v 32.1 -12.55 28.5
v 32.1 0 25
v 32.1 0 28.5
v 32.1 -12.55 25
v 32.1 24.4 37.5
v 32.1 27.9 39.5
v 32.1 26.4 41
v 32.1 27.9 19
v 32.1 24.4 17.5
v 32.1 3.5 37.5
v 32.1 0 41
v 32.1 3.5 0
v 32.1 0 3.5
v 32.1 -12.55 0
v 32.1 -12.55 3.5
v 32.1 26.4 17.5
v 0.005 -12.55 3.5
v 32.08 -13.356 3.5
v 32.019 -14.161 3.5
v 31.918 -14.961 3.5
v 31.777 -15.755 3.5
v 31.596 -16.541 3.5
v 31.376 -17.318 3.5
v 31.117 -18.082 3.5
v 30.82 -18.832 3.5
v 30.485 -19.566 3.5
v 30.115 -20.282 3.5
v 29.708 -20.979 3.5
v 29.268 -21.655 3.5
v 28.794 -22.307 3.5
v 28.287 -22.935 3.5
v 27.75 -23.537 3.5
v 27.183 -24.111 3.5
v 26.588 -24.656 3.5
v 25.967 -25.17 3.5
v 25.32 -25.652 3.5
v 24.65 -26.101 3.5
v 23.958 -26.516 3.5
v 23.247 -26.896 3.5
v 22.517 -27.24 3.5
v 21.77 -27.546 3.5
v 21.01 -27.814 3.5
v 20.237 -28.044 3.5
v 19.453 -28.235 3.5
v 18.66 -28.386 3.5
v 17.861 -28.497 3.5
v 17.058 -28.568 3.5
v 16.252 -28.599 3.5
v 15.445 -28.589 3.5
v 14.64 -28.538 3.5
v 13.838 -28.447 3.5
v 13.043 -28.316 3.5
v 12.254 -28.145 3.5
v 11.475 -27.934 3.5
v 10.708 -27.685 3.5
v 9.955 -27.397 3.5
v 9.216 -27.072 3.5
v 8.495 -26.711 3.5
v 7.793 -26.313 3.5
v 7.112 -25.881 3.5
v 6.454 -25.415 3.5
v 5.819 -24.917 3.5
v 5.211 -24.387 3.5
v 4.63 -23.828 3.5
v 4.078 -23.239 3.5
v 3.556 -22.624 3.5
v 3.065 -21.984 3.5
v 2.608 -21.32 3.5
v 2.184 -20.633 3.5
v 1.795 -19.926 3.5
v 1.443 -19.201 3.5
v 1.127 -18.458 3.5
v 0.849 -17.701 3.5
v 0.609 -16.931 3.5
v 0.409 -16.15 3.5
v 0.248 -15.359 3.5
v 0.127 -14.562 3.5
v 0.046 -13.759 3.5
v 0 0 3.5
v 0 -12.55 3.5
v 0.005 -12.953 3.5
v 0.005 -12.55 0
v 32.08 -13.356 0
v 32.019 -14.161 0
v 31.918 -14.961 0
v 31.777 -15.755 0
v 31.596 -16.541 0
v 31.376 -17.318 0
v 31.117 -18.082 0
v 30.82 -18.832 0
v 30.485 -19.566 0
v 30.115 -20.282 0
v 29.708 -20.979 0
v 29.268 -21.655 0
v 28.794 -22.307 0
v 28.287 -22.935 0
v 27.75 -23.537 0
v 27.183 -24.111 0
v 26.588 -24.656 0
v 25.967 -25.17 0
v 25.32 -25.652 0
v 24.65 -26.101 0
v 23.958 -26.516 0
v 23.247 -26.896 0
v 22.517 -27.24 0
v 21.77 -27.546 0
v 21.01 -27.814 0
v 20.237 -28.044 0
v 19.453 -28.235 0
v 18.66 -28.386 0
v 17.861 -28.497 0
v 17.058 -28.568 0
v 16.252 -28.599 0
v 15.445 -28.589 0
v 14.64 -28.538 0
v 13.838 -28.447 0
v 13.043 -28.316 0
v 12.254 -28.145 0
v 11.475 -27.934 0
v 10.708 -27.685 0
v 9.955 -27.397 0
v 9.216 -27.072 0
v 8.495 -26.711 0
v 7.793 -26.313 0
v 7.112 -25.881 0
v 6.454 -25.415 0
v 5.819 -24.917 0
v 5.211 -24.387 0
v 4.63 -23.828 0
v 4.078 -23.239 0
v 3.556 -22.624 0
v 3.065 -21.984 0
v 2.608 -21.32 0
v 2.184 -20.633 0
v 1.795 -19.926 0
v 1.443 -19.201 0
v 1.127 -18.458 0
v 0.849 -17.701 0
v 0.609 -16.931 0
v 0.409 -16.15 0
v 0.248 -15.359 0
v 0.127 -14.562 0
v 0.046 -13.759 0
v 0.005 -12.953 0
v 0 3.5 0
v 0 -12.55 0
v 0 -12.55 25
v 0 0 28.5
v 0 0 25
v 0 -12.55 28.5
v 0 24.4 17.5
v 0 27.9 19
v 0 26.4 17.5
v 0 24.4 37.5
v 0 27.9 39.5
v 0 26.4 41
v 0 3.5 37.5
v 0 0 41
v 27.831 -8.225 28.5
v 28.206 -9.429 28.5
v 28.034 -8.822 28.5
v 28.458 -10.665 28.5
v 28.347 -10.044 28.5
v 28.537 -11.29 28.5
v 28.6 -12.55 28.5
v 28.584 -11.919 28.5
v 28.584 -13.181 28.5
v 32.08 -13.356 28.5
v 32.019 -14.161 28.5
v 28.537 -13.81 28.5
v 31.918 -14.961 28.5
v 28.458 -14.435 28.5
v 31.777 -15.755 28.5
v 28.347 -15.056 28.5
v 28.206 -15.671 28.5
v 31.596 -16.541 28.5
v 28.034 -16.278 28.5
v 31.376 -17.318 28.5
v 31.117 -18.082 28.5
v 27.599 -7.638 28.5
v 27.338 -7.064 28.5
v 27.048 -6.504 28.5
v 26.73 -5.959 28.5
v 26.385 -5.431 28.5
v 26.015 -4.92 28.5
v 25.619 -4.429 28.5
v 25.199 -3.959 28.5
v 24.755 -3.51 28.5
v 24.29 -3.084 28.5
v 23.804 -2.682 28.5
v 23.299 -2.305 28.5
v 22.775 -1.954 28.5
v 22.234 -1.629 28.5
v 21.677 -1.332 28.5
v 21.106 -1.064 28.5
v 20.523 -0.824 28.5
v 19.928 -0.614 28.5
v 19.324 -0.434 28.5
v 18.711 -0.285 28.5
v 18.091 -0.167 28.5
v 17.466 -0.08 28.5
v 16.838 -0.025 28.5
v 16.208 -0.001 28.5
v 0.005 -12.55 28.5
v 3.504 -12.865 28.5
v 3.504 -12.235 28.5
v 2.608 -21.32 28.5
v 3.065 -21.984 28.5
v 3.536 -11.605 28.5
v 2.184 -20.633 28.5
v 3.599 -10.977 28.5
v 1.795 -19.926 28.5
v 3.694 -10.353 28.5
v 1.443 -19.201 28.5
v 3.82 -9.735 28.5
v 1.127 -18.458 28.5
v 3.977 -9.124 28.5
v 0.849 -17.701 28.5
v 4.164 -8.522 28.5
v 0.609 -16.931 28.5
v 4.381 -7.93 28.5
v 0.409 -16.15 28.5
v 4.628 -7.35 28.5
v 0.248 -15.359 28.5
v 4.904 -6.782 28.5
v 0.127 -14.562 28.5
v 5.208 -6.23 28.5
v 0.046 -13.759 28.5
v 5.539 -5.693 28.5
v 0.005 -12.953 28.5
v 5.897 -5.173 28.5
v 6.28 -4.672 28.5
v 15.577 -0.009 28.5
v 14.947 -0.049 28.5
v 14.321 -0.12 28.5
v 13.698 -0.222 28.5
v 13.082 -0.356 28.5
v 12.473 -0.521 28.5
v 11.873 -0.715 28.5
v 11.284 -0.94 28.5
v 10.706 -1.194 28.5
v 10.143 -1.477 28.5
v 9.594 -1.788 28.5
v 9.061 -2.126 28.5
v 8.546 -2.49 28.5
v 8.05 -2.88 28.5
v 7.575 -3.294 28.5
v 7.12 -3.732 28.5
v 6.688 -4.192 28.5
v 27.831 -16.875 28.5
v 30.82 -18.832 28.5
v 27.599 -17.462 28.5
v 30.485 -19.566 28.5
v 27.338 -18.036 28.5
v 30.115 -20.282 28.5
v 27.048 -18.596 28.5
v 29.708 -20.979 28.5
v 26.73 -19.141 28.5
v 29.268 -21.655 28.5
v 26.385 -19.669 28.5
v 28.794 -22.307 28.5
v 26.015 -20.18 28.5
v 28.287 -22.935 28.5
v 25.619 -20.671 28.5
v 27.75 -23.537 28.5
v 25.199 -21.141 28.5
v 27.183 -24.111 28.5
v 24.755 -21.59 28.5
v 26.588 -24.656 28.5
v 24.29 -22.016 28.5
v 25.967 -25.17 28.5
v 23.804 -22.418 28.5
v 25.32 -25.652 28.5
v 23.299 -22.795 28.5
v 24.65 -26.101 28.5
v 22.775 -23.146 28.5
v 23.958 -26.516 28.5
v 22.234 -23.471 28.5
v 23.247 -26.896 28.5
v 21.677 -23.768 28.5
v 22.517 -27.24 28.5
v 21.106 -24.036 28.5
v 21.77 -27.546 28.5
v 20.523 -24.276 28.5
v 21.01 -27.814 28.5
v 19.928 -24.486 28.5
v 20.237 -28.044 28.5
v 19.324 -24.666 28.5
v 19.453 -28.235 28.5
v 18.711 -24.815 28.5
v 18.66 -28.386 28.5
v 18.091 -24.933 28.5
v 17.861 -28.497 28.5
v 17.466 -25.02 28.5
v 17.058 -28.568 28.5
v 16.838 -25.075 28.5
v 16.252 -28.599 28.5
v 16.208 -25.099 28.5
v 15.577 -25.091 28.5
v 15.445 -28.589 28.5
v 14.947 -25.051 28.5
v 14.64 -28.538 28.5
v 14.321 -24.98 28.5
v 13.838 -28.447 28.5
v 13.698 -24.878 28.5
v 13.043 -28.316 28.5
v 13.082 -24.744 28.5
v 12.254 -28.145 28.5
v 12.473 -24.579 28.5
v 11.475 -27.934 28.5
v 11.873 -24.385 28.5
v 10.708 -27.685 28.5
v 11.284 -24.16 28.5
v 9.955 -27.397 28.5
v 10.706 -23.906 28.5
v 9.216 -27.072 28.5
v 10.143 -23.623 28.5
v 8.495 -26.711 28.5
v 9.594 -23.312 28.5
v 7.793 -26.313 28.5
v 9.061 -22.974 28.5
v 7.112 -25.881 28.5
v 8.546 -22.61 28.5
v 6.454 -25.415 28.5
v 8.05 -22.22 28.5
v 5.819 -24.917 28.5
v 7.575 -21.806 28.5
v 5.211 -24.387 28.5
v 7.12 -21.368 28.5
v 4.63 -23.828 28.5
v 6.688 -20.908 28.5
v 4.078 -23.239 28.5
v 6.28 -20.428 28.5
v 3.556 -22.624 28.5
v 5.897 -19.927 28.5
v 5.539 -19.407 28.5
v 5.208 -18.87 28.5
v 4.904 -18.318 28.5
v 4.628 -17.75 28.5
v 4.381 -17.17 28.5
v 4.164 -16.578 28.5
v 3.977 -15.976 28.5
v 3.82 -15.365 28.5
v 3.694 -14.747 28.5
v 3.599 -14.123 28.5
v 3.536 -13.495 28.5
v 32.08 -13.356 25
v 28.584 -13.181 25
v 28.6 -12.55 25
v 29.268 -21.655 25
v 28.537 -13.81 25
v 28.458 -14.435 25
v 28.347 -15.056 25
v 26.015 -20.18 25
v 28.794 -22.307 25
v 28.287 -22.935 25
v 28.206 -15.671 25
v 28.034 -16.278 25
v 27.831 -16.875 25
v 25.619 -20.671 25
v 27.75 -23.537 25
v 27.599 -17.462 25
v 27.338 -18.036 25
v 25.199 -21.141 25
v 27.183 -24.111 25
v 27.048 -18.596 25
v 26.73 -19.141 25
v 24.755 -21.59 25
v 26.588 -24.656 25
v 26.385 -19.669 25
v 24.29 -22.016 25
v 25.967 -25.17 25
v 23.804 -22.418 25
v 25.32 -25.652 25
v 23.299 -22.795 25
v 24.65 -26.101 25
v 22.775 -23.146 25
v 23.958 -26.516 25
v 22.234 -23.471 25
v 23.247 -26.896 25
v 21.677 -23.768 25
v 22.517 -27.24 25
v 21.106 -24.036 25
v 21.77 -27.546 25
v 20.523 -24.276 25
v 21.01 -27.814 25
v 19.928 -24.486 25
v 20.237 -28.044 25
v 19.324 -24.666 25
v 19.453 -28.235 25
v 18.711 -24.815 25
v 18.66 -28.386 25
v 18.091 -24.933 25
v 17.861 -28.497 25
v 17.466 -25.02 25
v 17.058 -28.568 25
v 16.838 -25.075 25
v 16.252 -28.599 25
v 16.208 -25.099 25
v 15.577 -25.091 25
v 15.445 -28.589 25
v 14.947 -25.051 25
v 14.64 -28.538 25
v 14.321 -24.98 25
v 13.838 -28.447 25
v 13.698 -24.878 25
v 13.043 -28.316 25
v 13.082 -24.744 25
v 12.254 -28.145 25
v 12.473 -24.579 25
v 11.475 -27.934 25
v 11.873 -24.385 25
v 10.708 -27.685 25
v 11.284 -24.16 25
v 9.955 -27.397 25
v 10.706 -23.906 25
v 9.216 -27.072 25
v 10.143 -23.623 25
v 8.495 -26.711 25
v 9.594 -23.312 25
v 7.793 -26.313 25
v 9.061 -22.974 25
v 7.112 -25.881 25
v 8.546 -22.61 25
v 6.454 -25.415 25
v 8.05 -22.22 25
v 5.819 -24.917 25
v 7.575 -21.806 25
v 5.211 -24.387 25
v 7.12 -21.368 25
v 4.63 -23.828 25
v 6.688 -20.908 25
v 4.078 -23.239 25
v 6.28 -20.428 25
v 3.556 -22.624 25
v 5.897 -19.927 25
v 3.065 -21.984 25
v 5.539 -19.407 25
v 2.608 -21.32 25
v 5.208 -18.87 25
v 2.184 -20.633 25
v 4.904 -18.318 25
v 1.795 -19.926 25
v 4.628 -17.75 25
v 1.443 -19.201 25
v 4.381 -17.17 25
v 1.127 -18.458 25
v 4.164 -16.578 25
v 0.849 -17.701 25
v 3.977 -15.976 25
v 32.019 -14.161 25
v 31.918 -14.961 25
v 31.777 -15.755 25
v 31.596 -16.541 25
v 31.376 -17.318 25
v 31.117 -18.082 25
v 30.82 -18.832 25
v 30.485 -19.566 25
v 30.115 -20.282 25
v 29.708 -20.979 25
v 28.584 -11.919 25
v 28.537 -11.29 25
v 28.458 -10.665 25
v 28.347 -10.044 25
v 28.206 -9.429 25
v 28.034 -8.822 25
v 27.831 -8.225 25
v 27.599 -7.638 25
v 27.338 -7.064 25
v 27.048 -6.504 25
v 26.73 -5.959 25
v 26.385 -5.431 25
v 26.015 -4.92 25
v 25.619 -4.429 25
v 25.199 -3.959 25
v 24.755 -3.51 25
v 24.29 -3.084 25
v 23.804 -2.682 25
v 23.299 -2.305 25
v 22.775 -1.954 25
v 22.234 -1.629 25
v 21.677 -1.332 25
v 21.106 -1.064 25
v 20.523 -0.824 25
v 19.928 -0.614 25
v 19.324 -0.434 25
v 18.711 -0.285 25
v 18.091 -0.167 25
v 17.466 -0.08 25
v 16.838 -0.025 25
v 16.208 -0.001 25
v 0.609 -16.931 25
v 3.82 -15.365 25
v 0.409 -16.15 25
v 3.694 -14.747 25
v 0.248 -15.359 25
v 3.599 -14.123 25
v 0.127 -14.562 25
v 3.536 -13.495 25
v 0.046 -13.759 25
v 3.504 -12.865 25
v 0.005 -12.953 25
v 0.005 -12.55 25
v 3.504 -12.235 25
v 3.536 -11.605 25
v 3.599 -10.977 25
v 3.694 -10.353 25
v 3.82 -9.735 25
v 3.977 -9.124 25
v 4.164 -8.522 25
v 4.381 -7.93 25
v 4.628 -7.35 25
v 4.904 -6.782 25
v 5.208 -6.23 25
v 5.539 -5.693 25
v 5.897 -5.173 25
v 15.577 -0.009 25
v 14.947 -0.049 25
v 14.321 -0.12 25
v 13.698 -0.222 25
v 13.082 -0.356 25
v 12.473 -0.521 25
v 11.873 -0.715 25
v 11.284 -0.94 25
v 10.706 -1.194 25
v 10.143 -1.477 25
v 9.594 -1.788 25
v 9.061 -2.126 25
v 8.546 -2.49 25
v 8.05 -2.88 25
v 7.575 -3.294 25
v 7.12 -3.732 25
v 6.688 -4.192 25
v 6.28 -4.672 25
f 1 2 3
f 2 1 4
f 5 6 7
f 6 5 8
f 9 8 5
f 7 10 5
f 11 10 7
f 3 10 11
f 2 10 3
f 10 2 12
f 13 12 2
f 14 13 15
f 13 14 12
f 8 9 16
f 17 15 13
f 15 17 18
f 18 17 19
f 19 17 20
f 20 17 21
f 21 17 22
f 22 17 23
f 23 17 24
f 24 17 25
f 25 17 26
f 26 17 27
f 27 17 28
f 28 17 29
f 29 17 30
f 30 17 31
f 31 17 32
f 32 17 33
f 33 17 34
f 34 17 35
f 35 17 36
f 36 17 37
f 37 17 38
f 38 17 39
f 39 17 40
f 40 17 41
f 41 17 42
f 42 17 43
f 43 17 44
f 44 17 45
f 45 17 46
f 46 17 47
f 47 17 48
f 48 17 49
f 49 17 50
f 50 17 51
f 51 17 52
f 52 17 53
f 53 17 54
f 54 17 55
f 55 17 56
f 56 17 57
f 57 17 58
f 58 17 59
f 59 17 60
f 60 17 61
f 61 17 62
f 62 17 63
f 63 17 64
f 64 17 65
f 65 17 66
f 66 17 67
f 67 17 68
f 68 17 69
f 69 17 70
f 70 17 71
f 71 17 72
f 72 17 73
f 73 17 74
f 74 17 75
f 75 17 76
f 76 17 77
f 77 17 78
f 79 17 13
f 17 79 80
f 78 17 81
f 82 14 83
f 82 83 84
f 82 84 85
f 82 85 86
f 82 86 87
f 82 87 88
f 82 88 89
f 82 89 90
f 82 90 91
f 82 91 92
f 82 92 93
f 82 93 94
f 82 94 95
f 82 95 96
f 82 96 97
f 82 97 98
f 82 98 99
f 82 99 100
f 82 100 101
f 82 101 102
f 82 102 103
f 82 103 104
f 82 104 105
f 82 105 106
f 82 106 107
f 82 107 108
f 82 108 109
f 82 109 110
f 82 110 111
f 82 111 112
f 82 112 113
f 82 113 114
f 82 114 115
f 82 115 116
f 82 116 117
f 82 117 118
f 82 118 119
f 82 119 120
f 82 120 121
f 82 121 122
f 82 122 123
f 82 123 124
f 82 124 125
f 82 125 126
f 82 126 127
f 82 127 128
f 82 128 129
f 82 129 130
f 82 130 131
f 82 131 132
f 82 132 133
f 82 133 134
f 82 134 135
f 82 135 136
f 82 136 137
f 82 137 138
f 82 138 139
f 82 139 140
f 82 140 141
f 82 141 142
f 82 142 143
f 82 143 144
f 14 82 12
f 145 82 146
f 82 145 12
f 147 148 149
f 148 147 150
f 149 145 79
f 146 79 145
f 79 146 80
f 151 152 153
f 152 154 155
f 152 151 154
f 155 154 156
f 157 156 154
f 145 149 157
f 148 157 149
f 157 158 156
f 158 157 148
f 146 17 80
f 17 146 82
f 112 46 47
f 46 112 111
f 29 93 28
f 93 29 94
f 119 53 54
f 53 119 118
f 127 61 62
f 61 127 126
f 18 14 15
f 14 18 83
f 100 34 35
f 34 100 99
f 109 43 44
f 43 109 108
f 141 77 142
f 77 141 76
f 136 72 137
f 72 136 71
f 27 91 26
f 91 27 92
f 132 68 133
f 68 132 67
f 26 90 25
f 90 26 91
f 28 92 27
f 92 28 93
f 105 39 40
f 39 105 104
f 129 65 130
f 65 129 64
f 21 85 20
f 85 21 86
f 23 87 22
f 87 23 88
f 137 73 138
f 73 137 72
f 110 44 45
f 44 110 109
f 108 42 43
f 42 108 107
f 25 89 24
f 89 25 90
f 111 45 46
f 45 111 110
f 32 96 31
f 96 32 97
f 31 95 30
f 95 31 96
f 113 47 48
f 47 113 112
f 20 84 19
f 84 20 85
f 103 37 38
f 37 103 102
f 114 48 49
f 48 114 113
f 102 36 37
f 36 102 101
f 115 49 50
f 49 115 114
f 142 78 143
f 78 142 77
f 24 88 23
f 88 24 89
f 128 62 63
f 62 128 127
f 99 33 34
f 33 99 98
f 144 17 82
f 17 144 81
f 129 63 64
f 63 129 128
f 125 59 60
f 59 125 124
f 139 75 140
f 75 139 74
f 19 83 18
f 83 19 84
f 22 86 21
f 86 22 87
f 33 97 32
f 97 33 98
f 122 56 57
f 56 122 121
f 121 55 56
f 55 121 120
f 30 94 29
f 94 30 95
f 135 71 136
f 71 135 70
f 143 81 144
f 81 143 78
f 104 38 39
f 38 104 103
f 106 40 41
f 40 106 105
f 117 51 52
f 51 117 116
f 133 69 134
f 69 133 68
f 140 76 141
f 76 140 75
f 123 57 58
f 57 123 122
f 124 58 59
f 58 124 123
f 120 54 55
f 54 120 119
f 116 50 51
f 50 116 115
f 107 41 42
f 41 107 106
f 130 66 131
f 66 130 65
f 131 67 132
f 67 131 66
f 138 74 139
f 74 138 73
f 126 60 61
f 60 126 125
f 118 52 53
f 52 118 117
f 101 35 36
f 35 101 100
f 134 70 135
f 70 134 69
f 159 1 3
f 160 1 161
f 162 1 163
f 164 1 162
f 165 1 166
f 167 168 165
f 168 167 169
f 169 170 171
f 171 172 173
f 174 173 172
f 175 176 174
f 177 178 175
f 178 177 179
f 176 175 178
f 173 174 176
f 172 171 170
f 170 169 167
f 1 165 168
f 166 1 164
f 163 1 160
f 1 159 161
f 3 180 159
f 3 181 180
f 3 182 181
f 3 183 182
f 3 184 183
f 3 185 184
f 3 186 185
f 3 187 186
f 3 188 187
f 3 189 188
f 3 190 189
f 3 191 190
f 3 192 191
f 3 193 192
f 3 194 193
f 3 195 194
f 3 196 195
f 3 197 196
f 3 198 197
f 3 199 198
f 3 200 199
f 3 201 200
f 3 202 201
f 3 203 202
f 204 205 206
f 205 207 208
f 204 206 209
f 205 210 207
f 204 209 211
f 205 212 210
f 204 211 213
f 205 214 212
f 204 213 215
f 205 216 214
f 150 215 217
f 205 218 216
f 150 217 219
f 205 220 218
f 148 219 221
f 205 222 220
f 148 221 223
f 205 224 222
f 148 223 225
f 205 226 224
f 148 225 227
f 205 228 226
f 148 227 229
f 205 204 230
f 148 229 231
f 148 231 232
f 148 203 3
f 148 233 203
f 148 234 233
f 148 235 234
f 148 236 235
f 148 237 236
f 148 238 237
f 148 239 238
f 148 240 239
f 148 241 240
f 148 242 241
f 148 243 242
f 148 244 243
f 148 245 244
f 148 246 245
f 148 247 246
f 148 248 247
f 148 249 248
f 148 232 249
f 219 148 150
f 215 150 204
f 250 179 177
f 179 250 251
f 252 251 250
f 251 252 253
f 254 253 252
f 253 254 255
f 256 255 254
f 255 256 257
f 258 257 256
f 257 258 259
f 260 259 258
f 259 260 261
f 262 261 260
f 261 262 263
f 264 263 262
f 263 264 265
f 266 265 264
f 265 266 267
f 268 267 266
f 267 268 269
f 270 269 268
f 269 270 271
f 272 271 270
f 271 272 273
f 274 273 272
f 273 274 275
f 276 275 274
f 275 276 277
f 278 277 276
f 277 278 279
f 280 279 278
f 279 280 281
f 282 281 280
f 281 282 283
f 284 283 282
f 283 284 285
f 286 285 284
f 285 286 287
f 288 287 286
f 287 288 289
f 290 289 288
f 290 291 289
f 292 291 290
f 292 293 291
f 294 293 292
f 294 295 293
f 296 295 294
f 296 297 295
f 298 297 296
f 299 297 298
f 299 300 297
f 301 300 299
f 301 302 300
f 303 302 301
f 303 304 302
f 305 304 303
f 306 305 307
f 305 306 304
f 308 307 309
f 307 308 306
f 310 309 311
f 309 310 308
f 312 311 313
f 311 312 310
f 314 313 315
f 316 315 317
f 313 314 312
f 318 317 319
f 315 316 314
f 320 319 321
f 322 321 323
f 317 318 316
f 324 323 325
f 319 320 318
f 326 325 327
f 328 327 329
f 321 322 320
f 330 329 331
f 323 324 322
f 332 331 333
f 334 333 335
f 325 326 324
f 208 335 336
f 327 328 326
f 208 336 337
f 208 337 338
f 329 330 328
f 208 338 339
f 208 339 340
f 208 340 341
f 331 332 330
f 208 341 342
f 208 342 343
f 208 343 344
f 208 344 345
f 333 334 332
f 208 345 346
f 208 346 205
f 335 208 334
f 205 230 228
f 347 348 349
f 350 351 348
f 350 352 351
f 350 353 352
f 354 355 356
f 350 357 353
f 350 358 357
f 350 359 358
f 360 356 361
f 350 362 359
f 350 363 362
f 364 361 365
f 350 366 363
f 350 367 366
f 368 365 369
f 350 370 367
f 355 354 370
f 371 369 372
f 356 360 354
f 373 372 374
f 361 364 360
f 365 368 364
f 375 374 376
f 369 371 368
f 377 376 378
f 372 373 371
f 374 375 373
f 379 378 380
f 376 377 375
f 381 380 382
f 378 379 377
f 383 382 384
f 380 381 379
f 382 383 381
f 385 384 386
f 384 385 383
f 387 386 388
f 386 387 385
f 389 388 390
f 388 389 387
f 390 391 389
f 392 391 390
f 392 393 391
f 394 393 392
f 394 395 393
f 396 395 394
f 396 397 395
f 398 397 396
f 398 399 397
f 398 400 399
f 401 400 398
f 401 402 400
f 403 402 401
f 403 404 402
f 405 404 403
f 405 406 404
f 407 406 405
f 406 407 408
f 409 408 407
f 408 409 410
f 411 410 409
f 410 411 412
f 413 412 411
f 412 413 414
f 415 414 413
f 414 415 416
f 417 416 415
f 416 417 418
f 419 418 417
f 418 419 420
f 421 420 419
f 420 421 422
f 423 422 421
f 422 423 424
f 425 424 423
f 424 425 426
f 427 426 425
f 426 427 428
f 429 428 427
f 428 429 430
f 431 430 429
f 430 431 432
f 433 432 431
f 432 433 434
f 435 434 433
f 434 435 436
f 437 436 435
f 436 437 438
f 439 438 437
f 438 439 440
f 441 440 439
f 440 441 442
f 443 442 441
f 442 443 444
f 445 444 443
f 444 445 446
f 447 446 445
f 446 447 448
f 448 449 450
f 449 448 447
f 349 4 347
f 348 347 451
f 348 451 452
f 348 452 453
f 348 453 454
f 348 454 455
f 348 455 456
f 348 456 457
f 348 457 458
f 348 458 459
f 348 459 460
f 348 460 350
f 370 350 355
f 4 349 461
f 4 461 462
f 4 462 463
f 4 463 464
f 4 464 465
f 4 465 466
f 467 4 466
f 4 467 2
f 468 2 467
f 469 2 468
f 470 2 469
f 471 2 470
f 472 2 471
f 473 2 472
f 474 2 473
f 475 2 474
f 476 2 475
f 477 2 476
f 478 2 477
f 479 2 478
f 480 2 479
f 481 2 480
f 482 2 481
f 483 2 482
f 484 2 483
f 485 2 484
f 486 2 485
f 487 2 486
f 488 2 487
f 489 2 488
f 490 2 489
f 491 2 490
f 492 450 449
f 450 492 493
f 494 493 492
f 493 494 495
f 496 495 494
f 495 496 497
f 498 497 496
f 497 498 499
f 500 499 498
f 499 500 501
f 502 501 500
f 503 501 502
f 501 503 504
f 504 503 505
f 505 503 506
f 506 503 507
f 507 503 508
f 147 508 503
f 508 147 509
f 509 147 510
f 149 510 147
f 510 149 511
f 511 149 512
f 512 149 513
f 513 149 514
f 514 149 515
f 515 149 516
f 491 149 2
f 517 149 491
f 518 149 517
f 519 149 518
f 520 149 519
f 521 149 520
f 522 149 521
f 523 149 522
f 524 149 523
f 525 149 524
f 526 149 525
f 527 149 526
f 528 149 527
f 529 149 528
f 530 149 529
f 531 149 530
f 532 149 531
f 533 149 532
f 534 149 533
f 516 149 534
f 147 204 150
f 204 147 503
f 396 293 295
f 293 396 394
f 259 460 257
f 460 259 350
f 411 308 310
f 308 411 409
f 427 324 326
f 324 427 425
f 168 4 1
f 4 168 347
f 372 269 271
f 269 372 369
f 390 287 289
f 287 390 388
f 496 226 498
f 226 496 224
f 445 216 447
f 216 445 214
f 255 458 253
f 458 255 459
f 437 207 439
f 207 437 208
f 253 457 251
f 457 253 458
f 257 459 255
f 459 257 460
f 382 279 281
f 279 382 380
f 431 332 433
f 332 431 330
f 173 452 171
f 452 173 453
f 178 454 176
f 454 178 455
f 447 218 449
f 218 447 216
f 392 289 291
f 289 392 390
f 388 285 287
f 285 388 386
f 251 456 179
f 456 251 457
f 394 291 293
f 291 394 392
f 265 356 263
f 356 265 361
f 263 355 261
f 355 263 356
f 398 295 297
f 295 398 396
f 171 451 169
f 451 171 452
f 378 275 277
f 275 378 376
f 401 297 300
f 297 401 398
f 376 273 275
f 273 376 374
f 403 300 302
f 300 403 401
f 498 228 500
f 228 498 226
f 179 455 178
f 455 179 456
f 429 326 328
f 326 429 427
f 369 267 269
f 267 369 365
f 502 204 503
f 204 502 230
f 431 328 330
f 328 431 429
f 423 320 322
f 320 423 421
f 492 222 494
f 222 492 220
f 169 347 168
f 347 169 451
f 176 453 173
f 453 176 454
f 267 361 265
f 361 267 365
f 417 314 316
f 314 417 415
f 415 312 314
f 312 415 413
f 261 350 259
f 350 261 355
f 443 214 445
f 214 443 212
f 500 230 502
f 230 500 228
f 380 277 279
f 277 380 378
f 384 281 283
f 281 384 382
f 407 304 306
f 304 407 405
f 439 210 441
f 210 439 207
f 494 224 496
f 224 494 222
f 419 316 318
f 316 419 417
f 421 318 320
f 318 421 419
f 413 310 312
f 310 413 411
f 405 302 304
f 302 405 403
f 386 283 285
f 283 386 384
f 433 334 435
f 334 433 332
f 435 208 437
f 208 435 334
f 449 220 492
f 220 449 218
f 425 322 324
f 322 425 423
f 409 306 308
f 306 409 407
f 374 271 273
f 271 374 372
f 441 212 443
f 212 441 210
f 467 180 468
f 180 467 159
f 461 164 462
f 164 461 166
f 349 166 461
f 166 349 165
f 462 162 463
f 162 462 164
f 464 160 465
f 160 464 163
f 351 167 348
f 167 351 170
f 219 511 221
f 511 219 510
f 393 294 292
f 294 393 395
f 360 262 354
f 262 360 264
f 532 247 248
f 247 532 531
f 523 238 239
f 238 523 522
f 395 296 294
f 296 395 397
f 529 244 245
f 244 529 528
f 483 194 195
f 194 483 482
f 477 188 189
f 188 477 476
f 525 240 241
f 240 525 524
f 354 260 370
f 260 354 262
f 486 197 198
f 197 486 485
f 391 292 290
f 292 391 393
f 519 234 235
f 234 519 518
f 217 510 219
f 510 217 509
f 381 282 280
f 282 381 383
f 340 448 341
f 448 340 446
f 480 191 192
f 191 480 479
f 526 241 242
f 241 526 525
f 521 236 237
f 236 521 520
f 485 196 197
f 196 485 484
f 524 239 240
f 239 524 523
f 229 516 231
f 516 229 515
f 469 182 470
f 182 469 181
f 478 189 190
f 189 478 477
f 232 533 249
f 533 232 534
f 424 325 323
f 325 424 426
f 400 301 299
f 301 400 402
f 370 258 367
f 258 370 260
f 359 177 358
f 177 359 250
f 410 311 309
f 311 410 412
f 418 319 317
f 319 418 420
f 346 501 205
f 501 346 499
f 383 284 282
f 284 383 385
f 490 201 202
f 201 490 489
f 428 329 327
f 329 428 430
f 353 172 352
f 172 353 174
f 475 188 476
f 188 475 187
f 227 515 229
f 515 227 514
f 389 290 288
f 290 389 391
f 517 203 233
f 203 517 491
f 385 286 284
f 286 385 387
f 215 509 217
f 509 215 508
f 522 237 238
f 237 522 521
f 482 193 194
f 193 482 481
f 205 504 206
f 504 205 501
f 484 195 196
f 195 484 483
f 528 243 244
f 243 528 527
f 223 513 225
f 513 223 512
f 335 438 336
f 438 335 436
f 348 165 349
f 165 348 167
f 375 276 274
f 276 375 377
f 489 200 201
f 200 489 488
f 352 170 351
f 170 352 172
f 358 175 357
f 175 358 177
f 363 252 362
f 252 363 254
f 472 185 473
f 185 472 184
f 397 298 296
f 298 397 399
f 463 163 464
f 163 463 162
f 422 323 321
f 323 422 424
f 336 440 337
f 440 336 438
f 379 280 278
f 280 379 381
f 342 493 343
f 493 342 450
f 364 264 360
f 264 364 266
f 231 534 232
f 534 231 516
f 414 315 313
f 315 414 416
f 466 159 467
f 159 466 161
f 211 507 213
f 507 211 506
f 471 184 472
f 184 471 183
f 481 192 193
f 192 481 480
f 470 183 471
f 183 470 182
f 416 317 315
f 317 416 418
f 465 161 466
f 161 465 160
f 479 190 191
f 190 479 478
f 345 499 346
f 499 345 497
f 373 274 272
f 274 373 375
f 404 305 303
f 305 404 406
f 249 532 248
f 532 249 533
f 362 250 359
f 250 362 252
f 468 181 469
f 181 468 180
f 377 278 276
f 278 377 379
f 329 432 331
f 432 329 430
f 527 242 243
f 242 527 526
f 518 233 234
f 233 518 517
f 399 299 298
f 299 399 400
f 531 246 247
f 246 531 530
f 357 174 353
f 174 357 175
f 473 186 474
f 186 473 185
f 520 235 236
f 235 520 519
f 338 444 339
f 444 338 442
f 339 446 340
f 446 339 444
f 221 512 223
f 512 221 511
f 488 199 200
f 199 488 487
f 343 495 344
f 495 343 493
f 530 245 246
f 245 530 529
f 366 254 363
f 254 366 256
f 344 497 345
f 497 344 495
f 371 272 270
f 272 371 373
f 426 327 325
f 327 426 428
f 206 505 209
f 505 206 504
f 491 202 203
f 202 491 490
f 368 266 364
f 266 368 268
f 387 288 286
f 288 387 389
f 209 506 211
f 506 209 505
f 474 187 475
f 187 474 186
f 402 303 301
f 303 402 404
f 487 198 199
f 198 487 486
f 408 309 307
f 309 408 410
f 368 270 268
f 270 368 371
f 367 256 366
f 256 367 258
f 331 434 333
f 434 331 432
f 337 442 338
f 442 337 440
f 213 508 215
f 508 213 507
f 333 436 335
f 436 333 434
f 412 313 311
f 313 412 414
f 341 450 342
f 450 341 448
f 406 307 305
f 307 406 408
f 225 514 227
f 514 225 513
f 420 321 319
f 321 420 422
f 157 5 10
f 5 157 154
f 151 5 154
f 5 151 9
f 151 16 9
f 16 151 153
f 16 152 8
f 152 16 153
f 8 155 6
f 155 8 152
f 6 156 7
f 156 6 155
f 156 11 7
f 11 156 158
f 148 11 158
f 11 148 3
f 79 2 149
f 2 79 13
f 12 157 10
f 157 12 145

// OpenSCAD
// file: Parts/Screw.scad
// created by IndiePandaaaaa | Lukas

$fn=50;

function cone_diameter(diameter)=diameter * 2;

function cone_diameter_cutout(diameter)=diameter * 2 + 0.5;

function cone_height(diameter)=diameter * 0.75;

module screw(diameter, length=12, cutout_sample=false) {
  module base_model(diameter, length, cone_height, cone_diameter, offset=0) {
    rotate_extrude() {
      polygon([
          [0, 0],
          [(diameter + offset) / 2, 0],
          [(diameter + offset) / 2, (length + offset) - (cone_height + offset)],
          [(cone_diameter + offset) / 2, length + offset],
          [0, length + offset],
        ]);
    }
  }

  if (length < diameter) {
    echo("Screw is too short");
    length=diameter + 5;
    echo("New length is: ", length);
  }

  if (!cutout_sample) {
    translate([0, 0, -length])
      difference() {
        base_model(diameter, length, cone_height(diameter), cone_diameter(diameter));

        // top cross part
        translate([0, 0, length - (cone_height(diameter) - diameter / 2) + .1])
          difference() {
            rotate([0, 0, 45])
              rotate_extrude() {
                polygon([
                    [0, 0],
                    [diameter * 1.4 / 2, 0],
                    [cone_diameter(diameter) / 3, cone_height(diameter) - diameter / 2],
                    [0, cone_height(diameter) - diameter / 2],
                  ]);
              }
            for (i=[0 : 1 : 3]) {
              rotate([0, 0, 90 * i])
                translate([diameter / 3.18 / 2, diameter / 3.18 / 2, 0]) cube(cone_height(diameter));
            }
          }
      }
  } else {
    offset=0;
    diameter=cone_diameter_cutout(diameter) / 2;  // is duplicated by function, used to reduce error
    translate([0, 0, -length - offset / 2]) {
      base_model(diameter, length, cone_height(diameter), cone_diameter(diameter), offset);
      translate([0, 0, length -.005]) cylinder(r=diameter, h=50);
    }
  }
}

module screw_corehole(diameter_screw, diameter_core, unthreaded_length, length=12) {
  union() {
    screw(diameter=diameter_screw, length=unthreaded_length, cutout_sample=true);
    translate([0, 0, -length]) cylinder(d=diameter_core, h=length - unthreaded_length + .1);
  }
}

module screw_with_nut(screw_length, diameter, square_channel=false, tolerance=.1) {
  function od(width) = ((width/2) / cos(30)) * 2; // calculates nut diameter from given width
  nut_thickness=[0.8, 1.6, 2.4, 3.2, 4, 5, 5.5, 6.5];
  nut_width=[2.5, 4, 5.5, 7.1, 8.1, 10.1, 11.1, 13.1];

  if (!(0 < diameter && diameter <= 8 && diameter == round(diameter))) {
    echo("module is only defined for integer values from M1 to M8.");
  } else {
    union() {
      if (!square_channel) {
        screw(diameter=diameter, length=screw_length, cutout_sample=true);

        translate([0, 0, -(screw_length*2 - nut_thickness[diameter - 1])]) 
          cylinder(d=od(nut_width[diameter - 1]) + tolerance, h=screw_length, $fn=6);

      } else {
        screw(diameter=diameter, length=screw_length + diameter, cutout_sample=true);
        translate([-od(nut_width[diameter - 1])/2 - tolerance, -(nut_width[diameter - 1]/2), -(screw_length)]) 
          cube([od(nut_width[diameter - 1]) + screw_length, nut_width[diameter - 1] + tolerance, nut_thickness[diameter - 1] + tolerance]);
      }
    }
  }
}

translate([ 0, 0, 0]) screw(diameter=3.5, length=12, cutout_sample=false);
translate([20, 0, 0]) screw_corehole(diameter_screw=3, diameter_core=2.5, unthreaded_length=15, length=20);
translate([40, 0, 0]) screw_with_nut(screw_length=30, diameter=4, square_channel=false, tolerance=.1);
// main file
// created by IndiePandaaaaa | Lukas

use <Parts/Screw.scad>

THICKNESS = 3.5;
TOLERANCE = 0.1;
CHAMFER = 1.5;
SCREW_OD = 3.5;
$fn = $preview ? 25 : 125;

BOARD_THICKNESS = 20.8;
MOUNT_HEIGHT = 20;

module top_mount()
{
    rotate([ 90, 0, 90 ]) difference()
    {
        linear_extrude(SCREW_OD * 4)
        {
            polygon([
                [ 0, CHAMFER ],
                [ CHAMFER, 0 ],
                [ THICKNESS, 0 ],
                [ THICKNESS, BOARD_THICKNESS ],
                [ THICKNESS + BOARD_THICKNESS + TOLERANCE, BOARD_THICKNESS ],
                [ THICKNESS + BOARD_THICKNESS + TOLERANCE, 0 ],
                [ THICKNESS * 2 + BOARD_THICKNESS + TOLERANCE - CHAMFER, 0 ],
                [ THICKNESS * 2 + BOARD_THICKNESS + TOLERANCE, CHAMFER ],
                [ THICKNESS * 2 + BOARD_THICKNESS + TOLERANCE, BOARD_THICKNESS + THICKNESS ],
                [ THICKNESS * 2 + BOARD_THICKNESS + TOLERANCE, BOARD_THICKNESS + THICKNESS + MOUNT_HEIGHT ],
                [ THICKNESS + BOARD_THICKNESS + TOLERANCE, BOARD_THICKNESS + THICKNESS + MOUNT_HEIGHT ],
                [ THICKNESS + BOARD_THICKNESS + TOLERANCE, BOARD_THICKNESS + THICKNESS ],
                [ CHAMFER, BOARD_THICKNESS + THICKNESS ],
                [ 0, BOARD_THICKNESS + THICKNESS - CHAMFER ],
            ]);
        }
        translate([
            THICKNESS * 2 + BOARD_THICKNESS + TOLERANCE, BOARD_THICKNESS + MOUNT_HEIGHT + THICKNESS - SCREW_OD * 2,
            SCREW_OD * 2
        ]) rotate([ 0, 90, 0 ]) screw(SCREW_OD, 12, true);
    }
}

module vertical_mount(width = 28.5, height = 58.5)
{
    rotate([ 90, 0, 90 ]) linear_extrude(width)
    {
        polygon([
            [ 0, 0 ],
            [ THICKNESS, 0 ],
            [ THICKNESS, height ],
            [ THICKNESS + BOARD_THICKNESS + TOLERANCE, height ],
            [ THICKNESS + BOARD_THICKNESS + TOLERANCE, height - MOUNT_HEIGHT ],
            [ THICKNESS * 2 + BOARD_THICKNESS + TOLERANCE - CHAMFER, height - MOUNT_HEIGHT ],
            [ THICKNESS * 2 + BOARD_THICKNESS + TOLERANCE, height - MOUNT_HEIGHT + CHAMFER ],
            [ THICKNESS * 2 + BOARD_THICKNESS + TOLERANCE, height + THICKNESS - CHAMFER ],
            [ THICKNESS * 2 + BOARD_THICKNESS + TOLERANCE - CHAMFER, height + THICKNESS ],
            [ 0, height + THICKNESS ],
        ]);
    }
}

module bottle_holder(diameter = 20)
{
    size = diameter + THICKNESS * 2 + TOLERANCE;
    union()
    {
        vertical_mount(width = size, height = diameter * 1.5);
        translate([ 0, -size / 2 + THICKNESS, 0 ]) union()
        {
            cube([ size, size / 2, THICKNESS ]);
            translate(v = [ size / 2, 0, 0 ]) cylinder(h = THICKNESS, r = size / 2, center = false);
        }
        translate(v = [ 0, -size / 2 + THICKNESS, diameter ]) difference()
        {
            union()
            {
                cube([ size, size / 2, THICKNESS ]);
                translate(v = [ size / 2, 0, 0 ]) cylinder(h = THICKNESS, r = size / 2, center = false);
            }
            translate(v = [ size / 2, 0, -diameter / 2 ])
                cylinder(h = diameter, r = (diameter + TOLERANCE) / 2, center = false);
        }
    }
}

// translate([ 10, 0, 0 ]) top_mount();
// translate([ 40, 0, 0 ]) vertical_mount();
bottle_holder(25);
